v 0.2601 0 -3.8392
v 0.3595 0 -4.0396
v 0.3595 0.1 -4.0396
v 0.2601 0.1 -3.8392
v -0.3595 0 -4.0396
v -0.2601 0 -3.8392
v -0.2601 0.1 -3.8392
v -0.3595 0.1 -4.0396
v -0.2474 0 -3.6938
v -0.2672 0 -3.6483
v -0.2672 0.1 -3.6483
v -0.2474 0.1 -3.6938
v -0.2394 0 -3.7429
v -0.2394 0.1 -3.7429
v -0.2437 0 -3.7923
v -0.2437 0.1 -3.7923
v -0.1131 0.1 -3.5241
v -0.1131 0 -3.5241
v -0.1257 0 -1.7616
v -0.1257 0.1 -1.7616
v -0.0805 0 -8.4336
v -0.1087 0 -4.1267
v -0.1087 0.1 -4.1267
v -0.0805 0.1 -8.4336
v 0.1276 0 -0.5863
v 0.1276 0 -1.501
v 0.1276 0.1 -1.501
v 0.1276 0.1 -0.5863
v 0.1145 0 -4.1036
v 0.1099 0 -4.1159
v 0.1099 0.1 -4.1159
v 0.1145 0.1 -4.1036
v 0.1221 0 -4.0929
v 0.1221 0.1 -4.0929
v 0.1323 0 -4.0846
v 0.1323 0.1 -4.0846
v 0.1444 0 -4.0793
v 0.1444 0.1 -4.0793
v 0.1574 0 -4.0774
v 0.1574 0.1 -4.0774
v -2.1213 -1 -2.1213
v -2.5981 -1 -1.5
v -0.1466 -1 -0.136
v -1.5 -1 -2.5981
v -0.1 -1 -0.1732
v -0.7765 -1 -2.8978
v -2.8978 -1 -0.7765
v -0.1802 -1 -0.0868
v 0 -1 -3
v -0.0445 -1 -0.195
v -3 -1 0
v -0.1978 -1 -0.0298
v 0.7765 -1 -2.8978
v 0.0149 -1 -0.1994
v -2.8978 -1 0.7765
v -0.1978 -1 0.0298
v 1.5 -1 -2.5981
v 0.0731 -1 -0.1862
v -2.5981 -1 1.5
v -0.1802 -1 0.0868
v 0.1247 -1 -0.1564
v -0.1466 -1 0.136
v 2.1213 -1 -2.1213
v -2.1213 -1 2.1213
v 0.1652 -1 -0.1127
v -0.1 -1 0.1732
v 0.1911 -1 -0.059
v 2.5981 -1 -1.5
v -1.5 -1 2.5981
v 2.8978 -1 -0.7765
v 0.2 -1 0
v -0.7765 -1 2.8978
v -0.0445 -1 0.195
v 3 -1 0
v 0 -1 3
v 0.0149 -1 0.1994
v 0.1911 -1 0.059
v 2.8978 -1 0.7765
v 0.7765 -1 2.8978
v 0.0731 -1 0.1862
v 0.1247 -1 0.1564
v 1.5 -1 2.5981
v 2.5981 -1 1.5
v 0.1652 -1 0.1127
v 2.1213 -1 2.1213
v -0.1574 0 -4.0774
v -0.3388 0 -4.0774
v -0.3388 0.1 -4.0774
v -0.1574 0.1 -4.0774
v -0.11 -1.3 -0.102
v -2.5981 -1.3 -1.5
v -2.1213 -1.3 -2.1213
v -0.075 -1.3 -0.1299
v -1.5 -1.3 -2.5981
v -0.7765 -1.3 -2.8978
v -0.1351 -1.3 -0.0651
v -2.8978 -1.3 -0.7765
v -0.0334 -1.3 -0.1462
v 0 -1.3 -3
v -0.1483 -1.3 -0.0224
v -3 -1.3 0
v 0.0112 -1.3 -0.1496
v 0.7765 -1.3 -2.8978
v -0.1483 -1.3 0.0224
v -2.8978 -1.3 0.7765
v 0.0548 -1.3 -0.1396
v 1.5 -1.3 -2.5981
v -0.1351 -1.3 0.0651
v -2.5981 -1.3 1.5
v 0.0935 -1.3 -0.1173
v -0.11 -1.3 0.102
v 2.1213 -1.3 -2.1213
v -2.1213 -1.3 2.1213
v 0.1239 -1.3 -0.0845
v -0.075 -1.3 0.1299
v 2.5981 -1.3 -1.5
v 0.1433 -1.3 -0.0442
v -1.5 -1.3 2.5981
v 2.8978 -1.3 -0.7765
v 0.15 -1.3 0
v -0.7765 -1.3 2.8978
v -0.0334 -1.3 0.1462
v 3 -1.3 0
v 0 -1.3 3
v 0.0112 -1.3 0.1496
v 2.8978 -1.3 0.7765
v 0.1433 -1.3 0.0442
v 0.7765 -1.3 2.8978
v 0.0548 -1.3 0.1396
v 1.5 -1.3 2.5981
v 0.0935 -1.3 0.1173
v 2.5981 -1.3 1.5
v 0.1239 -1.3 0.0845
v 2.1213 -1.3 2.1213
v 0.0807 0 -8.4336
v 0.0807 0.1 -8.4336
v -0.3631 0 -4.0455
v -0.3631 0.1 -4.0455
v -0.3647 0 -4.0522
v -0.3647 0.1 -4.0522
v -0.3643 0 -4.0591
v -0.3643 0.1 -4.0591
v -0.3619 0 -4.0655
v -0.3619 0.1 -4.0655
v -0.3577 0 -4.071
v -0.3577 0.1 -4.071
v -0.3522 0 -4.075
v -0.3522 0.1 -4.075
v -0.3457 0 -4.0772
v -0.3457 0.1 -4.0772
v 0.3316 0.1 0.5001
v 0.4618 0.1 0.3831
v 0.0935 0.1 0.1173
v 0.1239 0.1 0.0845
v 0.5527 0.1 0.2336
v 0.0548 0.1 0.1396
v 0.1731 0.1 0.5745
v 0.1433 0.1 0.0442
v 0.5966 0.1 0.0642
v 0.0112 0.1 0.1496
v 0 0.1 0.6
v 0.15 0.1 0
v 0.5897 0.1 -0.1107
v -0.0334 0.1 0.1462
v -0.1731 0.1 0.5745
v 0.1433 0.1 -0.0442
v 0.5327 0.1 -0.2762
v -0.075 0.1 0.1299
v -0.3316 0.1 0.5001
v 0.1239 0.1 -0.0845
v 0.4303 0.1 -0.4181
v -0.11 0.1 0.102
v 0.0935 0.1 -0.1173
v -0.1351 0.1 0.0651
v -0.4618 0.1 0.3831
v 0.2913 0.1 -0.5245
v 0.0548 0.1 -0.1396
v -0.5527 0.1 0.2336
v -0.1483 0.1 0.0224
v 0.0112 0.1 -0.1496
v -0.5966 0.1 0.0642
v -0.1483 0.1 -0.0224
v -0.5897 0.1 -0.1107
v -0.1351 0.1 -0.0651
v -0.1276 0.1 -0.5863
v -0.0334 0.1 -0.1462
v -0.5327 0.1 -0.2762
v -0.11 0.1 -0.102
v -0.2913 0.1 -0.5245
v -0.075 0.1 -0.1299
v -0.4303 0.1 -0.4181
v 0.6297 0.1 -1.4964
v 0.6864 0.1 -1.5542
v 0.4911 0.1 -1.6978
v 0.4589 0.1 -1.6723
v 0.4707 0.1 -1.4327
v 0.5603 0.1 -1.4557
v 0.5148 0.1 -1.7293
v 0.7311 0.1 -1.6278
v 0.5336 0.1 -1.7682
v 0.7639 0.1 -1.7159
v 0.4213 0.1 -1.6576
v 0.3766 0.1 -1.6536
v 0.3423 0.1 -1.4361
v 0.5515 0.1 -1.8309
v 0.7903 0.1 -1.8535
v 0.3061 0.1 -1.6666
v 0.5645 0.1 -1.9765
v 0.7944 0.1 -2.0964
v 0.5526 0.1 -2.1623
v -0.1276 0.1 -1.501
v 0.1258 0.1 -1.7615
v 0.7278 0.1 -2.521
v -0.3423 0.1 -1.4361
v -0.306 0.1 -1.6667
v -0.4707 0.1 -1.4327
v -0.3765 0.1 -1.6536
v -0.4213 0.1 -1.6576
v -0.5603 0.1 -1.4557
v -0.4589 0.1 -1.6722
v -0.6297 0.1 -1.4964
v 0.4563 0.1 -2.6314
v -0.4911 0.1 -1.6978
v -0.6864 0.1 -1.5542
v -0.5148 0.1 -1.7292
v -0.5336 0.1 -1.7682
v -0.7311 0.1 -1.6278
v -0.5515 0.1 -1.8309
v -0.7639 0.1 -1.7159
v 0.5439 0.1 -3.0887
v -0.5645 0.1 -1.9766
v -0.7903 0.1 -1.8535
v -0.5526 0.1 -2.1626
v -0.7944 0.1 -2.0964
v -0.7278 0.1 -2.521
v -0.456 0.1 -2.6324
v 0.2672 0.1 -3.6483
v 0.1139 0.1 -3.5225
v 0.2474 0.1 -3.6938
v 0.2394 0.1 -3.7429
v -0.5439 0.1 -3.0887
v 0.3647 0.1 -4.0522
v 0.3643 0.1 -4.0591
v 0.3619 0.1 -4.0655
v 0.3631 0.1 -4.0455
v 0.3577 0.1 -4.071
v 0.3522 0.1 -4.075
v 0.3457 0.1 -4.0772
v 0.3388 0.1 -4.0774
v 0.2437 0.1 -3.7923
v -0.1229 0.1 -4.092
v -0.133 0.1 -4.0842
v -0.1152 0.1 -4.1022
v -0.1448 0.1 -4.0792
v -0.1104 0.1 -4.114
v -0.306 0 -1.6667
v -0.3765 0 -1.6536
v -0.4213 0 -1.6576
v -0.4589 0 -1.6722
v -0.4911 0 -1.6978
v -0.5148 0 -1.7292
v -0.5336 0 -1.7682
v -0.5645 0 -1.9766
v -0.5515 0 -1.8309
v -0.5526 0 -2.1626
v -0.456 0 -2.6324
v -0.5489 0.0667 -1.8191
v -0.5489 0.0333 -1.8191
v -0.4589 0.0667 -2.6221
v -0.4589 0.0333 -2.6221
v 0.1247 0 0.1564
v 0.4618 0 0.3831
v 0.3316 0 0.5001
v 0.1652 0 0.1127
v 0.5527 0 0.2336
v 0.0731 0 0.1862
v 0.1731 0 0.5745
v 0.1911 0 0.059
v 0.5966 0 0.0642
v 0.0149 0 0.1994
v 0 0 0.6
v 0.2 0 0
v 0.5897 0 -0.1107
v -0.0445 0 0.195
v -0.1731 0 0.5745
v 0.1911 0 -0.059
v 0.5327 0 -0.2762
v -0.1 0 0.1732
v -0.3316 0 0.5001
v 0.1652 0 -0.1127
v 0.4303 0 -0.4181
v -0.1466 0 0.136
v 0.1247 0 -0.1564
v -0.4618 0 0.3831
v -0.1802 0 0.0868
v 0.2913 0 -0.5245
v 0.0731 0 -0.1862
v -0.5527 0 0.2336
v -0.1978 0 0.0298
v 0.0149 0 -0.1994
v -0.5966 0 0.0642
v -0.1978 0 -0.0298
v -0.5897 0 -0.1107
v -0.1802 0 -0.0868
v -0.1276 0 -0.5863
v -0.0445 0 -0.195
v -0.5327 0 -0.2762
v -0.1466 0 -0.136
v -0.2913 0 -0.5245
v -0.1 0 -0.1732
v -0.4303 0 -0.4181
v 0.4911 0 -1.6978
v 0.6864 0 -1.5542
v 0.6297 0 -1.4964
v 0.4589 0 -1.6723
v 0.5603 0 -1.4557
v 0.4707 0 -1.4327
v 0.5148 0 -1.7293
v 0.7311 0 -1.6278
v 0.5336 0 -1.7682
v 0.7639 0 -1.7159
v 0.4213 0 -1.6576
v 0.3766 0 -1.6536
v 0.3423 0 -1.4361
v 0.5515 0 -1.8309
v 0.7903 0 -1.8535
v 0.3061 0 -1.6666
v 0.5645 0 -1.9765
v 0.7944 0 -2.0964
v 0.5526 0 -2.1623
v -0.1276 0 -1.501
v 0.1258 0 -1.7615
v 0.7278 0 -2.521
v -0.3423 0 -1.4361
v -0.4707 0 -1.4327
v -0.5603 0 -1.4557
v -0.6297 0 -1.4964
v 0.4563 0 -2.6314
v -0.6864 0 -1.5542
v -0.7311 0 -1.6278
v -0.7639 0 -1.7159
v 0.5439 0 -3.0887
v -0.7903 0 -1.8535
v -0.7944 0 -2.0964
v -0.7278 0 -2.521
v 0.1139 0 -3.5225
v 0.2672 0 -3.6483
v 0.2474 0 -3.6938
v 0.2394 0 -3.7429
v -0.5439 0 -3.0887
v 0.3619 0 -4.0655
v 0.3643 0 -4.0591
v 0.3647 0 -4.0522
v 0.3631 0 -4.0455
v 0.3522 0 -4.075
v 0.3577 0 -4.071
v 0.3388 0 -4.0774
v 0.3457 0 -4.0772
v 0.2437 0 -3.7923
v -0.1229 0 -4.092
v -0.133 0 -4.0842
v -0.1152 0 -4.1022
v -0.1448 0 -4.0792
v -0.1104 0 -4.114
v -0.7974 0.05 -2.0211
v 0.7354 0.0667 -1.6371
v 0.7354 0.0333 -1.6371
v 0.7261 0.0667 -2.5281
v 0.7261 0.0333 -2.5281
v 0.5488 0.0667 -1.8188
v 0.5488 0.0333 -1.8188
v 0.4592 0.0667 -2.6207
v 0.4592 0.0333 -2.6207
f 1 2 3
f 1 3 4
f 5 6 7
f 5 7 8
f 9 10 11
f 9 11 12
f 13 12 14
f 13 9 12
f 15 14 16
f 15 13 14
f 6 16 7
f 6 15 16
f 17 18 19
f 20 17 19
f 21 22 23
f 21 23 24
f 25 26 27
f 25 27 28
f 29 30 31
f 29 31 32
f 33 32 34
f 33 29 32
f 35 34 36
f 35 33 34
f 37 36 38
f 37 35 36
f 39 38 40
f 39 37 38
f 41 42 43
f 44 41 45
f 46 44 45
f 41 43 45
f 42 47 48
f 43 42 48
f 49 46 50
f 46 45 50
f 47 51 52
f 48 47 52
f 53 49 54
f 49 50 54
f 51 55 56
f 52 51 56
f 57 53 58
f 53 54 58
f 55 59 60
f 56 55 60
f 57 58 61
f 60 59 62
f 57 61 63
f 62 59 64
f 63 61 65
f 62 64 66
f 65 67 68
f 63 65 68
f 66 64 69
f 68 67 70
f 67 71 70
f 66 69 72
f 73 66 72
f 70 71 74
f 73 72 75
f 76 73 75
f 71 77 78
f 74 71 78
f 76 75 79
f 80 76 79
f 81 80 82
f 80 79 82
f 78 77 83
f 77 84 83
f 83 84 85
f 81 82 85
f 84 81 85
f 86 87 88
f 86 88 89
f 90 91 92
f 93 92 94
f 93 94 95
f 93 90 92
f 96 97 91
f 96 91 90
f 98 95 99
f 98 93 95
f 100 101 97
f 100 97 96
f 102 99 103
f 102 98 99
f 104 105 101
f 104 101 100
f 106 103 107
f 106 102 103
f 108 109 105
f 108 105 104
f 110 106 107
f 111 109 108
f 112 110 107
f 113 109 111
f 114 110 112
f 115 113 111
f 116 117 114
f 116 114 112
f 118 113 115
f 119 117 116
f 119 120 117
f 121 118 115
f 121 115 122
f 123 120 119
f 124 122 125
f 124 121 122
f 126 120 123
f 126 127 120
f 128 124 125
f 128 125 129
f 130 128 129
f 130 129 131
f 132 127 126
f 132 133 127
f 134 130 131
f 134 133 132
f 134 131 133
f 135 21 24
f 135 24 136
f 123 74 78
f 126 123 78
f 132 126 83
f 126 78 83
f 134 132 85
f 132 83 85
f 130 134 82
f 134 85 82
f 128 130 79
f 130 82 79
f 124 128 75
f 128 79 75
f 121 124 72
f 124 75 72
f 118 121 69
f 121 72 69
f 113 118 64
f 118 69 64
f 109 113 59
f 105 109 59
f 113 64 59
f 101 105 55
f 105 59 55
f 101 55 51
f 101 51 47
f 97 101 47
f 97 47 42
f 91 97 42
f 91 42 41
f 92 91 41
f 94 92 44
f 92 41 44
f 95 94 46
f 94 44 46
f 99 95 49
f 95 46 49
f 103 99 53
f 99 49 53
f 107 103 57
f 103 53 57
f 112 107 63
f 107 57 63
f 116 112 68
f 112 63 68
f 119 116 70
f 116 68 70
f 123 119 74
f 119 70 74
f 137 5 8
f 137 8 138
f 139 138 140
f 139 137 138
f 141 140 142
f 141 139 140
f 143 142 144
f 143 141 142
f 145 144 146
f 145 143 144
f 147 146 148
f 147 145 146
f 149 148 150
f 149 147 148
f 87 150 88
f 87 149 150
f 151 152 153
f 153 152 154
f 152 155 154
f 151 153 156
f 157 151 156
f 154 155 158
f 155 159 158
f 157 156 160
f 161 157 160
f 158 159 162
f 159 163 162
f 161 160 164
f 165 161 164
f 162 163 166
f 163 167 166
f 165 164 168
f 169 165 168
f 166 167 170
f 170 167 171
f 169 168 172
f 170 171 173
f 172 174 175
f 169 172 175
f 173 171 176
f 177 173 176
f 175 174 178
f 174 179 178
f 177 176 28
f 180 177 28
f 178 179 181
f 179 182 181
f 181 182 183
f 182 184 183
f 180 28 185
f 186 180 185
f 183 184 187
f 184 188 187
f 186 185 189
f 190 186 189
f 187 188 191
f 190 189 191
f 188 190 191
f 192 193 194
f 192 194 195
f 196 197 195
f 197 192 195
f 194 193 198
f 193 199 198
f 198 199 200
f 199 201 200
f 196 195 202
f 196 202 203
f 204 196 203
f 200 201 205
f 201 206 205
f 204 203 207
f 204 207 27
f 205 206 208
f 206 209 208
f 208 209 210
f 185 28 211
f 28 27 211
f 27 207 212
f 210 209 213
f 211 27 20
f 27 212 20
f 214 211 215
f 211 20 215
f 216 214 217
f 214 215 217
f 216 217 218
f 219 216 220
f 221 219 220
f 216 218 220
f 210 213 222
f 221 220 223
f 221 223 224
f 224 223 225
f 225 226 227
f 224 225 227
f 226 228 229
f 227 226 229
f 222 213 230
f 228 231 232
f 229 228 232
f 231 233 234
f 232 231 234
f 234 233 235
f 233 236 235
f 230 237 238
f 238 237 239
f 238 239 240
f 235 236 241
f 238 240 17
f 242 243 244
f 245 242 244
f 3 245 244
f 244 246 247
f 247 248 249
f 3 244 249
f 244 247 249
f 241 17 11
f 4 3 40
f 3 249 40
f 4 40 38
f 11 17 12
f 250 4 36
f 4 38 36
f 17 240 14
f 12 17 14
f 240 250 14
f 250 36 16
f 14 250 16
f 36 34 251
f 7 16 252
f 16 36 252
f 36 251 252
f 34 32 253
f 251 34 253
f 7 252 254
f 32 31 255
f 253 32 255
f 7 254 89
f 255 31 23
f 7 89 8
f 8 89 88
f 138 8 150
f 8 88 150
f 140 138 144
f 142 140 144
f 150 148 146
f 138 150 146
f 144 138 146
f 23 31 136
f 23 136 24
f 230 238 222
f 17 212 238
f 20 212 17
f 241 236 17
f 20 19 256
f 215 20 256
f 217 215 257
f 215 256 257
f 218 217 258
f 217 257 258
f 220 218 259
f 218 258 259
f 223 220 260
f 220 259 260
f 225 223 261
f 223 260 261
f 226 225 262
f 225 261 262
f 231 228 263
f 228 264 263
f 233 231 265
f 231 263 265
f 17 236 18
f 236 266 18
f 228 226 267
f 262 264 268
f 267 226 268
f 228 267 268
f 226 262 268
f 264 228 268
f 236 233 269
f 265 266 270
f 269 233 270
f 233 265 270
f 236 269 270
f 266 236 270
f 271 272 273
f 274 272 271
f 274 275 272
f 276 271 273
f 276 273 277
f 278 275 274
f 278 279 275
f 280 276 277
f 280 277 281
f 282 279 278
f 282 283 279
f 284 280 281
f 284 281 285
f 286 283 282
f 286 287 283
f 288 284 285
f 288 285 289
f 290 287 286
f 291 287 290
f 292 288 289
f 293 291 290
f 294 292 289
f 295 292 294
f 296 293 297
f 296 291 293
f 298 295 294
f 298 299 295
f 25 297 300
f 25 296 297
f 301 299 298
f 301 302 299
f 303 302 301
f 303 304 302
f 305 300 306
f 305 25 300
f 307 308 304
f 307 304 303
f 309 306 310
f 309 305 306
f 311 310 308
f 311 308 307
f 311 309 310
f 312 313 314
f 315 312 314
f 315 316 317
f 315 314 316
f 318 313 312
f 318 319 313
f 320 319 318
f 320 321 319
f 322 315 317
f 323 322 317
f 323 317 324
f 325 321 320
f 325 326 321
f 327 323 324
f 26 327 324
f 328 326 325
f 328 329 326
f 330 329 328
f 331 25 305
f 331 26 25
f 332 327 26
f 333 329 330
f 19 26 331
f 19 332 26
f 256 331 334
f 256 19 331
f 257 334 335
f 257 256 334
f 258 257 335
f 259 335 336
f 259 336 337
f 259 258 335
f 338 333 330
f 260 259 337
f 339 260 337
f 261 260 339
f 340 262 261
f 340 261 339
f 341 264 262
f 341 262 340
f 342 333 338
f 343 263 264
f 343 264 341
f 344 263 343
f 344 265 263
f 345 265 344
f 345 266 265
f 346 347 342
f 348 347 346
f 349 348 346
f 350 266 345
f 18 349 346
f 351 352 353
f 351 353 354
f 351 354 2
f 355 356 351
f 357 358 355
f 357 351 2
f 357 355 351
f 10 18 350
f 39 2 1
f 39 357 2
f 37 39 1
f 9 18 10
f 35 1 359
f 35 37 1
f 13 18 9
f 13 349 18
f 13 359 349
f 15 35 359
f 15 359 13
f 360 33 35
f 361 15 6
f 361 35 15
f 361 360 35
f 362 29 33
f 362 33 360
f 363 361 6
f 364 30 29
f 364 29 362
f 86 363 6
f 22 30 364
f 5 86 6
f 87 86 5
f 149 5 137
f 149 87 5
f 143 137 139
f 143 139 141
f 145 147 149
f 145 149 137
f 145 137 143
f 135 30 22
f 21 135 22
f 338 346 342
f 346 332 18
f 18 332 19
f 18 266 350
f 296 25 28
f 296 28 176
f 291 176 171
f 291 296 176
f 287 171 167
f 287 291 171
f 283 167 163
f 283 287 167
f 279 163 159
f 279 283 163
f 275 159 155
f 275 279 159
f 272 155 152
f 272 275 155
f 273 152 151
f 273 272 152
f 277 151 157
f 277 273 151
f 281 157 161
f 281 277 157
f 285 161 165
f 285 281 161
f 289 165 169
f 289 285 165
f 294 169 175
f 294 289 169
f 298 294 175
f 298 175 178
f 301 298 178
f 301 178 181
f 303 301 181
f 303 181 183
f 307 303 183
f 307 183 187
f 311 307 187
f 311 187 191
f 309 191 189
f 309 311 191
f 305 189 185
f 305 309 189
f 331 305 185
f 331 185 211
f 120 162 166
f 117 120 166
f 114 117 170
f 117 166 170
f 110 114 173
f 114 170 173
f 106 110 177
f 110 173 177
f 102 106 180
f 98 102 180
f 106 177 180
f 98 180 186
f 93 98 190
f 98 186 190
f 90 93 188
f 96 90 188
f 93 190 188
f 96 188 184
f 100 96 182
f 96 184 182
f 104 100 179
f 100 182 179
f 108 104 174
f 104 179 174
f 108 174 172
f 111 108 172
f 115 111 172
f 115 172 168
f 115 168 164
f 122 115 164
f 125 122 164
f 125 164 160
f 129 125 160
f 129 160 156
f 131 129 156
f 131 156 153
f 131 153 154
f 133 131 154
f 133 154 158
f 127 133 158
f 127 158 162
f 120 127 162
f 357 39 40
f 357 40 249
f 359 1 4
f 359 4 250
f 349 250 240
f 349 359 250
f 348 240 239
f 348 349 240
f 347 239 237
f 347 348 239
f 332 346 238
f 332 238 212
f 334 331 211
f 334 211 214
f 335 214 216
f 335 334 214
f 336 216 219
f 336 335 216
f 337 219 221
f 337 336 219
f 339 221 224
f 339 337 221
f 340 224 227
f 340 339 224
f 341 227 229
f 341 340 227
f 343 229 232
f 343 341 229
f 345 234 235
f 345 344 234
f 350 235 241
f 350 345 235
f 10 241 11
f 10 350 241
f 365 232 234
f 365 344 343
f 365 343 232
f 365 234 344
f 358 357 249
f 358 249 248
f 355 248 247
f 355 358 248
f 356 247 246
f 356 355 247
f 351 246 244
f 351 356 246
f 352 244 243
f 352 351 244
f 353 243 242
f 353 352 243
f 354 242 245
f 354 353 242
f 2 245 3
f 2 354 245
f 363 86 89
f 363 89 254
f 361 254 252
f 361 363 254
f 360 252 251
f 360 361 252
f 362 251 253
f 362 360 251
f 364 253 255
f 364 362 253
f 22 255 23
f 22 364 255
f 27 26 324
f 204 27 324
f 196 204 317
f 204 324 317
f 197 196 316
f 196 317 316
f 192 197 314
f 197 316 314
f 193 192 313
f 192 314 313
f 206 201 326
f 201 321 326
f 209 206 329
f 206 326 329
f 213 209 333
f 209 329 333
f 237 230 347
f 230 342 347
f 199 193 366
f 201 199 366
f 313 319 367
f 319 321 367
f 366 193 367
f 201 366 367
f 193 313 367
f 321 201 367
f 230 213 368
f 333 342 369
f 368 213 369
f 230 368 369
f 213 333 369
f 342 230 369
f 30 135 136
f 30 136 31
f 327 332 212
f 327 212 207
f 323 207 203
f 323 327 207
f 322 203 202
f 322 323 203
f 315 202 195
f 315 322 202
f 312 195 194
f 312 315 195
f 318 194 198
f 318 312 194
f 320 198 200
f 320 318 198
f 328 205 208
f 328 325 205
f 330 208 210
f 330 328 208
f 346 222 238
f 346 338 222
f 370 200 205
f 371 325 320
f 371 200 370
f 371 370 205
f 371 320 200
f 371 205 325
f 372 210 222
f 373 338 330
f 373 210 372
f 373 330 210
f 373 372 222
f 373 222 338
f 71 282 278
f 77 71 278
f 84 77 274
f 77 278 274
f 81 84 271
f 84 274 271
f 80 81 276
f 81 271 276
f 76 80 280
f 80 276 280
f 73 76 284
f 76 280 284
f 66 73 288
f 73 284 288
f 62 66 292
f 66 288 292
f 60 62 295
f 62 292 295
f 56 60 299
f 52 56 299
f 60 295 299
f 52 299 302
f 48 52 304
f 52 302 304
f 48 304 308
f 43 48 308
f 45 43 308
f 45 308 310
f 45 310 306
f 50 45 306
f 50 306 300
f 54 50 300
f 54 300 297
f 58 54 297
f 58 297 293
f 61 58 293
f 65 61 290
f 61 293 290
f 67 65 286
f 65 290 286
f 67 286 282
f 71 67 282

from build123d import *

# Parameters (mm, degrees)
BOSS_EXTRUDE1_DEPTH = 0.1
SKETCH2_R           = 0.2
BOSS_EXTRUDE2_DEPTH = 1
SKETCH3_R           = 3
BOSS_EXTRUDE3_DEPTH = 0.3
SKETCH4_R           = 0.15
CUT_EXTRUDE1_DEPTH  = 2.4


with BuildPart() as part:
    # Sketch1 → Boss-Extrude1 (new body)
    with BuildSketch(Plane(origin=(0, 0, 0), x_dir=(1, 0, 0), z_dir=(0, 1, 0))):
        with BuildLine():
            Line((-0.127585763, 0.586277983), (-0.127585763, 1.500996355))
            add(Edge.make_bspline(
                [(-0.127585763, 1.500996355), (-0.613609966, 1.292745221), (-0.997428455, 1.836597424), (-0.58121193, 3.118510404), (-0.267201121, 3.648320045)],
                knots=[0, 0, 0, 0, 0.463523694, 0.927047389, 0.927047389, 0.927047389, 0.927047389], degree=3))
            ThreePointArc((-0.267201121, 3.648320045), (-0.239390751, 3.74285385), (-0.260097073, 3.83919338))
            Line((-0.260097073, 3.83919338), (-0.359543258, 4.039599684))
            ThreePointArc((-0.359543258, 4.039599684), (-0.36190456, 4.065500923), (-0.338780115, 4.077405124))
            Line((-0.338780115, 4.077405124), (-0.157398308, 4.077405124))
            ThreePointArc((-0.157398308, 4.077405124), (-0.122926977, 4.092023881), (-0.108734749, 4.126672999))
            Line((-0.108734749, 4.126672999), (-0.080541531, 8.433581196))
            Line((-0.080541531, 8.433581196), (0.080699272, 8.433581196))
            Line((0.080699272, 8.433581196), (0.109905863, 4.115918774))
            ThreePointArc((0.109905863, 4.115918774), (0.126940207, 4.088385312), (0.157398308, 4.077405124))
            Line((0.157398308, 4.077405124), (0.338780115, 4.077405124))
            ThreePointArc((0.338780115, 4.077405124), (0.36190456, 4.065500923), (0.359543258, 4.039599684))
            Line((0.359543258, 4.039599684), (0.260097073, 3.83919338))
            ThreePointArc((0.260097073, 3.83919338), (0.239390751, 3.74285385), (0.267201121, 3.648320045))
            add(Edge.make_bspline(
                [(0.127585763, 1.500996355), (1.09963417, 1.084494086), (0.895222739, 2.588700762), (0.267201121, 3.648320045)],
                knots=[0, 0, 0, 0, 0.927047389, 0.927047389, 0.927047389, 0.927047389], degree=3))
            Line((0.127585763, 1.500996355), (0.127585763, 0.586277983))
            ThreePointArc((0.127585763, 0.586277983), (0, -0.6), (-0.127585763, 0.586277983))
        make_face()
        with BuildLine():
            Line((0.113918239, 3.522473584), (0.125824318, 1.761520463))
            add(Edge.make_bspline(
                [(0.125824318, 1.761520463), (0.890796605, 1.231501017), (0.501435582, 2.785705467), (0.113918239, 3.522473584)],
                knots=[0.044229807, 0.044229807, 0.044229807, 0.044229807, 0.913901264, 0.913901264, 0.913901264, 0.913901264], degree=3))
        make_face(mode=Mode.SUBTRACT)
        with BuildLine():
            Line((-0.113060898, 3.524102277), (-0.125714788, 1.761596361))
            add(Edge.make_bspline(
                [(-0.125714788, 1.761596361), (-0.891397992, 1.23096165), (-0.500879166, 2.787963848), (-0.113060898, 3.524102277)],
                knots=[0.044188303, 0.044188303, 0.044188303, 0.044188303, 0.914542619, 0.914542619, 0.914542619, 0.914542619], degree=3))
        make_face(mode=Mode.SUBTRACT)
    extrude(amount=BOSS_EXTRUDE1_DEPTH)

    # Sketch2 → Boss-Extrude2 (add)
    with BuildSketch(Plane.XZ):
        Circle(SKETCH2_R)
    extrude(amount=BOSS_EXTRUDE2_DEPTH)

    # Sketch3 → Boss-Extrude3 (add)
    with BuildSketch(Plane.XZ.offset(1)):
        Circle(SKETCH3_R)
    extrude(amount=BOSS_EXTRUDE3_DEPTH)

    # Sketch4 → Cut-Extrude1 (cut, through all)
    with BuildSketch(Plane(origin=(0, 0.1, 0), x_dir=(1, 0, 0), z_dir=(0, 1, 0))):
        Circle(SKETCH4_R)
    extrude(amount=-CUT_EXTRUDE1_DEPTH, mode=Mode.SUBTRACT)


solid = part.part
